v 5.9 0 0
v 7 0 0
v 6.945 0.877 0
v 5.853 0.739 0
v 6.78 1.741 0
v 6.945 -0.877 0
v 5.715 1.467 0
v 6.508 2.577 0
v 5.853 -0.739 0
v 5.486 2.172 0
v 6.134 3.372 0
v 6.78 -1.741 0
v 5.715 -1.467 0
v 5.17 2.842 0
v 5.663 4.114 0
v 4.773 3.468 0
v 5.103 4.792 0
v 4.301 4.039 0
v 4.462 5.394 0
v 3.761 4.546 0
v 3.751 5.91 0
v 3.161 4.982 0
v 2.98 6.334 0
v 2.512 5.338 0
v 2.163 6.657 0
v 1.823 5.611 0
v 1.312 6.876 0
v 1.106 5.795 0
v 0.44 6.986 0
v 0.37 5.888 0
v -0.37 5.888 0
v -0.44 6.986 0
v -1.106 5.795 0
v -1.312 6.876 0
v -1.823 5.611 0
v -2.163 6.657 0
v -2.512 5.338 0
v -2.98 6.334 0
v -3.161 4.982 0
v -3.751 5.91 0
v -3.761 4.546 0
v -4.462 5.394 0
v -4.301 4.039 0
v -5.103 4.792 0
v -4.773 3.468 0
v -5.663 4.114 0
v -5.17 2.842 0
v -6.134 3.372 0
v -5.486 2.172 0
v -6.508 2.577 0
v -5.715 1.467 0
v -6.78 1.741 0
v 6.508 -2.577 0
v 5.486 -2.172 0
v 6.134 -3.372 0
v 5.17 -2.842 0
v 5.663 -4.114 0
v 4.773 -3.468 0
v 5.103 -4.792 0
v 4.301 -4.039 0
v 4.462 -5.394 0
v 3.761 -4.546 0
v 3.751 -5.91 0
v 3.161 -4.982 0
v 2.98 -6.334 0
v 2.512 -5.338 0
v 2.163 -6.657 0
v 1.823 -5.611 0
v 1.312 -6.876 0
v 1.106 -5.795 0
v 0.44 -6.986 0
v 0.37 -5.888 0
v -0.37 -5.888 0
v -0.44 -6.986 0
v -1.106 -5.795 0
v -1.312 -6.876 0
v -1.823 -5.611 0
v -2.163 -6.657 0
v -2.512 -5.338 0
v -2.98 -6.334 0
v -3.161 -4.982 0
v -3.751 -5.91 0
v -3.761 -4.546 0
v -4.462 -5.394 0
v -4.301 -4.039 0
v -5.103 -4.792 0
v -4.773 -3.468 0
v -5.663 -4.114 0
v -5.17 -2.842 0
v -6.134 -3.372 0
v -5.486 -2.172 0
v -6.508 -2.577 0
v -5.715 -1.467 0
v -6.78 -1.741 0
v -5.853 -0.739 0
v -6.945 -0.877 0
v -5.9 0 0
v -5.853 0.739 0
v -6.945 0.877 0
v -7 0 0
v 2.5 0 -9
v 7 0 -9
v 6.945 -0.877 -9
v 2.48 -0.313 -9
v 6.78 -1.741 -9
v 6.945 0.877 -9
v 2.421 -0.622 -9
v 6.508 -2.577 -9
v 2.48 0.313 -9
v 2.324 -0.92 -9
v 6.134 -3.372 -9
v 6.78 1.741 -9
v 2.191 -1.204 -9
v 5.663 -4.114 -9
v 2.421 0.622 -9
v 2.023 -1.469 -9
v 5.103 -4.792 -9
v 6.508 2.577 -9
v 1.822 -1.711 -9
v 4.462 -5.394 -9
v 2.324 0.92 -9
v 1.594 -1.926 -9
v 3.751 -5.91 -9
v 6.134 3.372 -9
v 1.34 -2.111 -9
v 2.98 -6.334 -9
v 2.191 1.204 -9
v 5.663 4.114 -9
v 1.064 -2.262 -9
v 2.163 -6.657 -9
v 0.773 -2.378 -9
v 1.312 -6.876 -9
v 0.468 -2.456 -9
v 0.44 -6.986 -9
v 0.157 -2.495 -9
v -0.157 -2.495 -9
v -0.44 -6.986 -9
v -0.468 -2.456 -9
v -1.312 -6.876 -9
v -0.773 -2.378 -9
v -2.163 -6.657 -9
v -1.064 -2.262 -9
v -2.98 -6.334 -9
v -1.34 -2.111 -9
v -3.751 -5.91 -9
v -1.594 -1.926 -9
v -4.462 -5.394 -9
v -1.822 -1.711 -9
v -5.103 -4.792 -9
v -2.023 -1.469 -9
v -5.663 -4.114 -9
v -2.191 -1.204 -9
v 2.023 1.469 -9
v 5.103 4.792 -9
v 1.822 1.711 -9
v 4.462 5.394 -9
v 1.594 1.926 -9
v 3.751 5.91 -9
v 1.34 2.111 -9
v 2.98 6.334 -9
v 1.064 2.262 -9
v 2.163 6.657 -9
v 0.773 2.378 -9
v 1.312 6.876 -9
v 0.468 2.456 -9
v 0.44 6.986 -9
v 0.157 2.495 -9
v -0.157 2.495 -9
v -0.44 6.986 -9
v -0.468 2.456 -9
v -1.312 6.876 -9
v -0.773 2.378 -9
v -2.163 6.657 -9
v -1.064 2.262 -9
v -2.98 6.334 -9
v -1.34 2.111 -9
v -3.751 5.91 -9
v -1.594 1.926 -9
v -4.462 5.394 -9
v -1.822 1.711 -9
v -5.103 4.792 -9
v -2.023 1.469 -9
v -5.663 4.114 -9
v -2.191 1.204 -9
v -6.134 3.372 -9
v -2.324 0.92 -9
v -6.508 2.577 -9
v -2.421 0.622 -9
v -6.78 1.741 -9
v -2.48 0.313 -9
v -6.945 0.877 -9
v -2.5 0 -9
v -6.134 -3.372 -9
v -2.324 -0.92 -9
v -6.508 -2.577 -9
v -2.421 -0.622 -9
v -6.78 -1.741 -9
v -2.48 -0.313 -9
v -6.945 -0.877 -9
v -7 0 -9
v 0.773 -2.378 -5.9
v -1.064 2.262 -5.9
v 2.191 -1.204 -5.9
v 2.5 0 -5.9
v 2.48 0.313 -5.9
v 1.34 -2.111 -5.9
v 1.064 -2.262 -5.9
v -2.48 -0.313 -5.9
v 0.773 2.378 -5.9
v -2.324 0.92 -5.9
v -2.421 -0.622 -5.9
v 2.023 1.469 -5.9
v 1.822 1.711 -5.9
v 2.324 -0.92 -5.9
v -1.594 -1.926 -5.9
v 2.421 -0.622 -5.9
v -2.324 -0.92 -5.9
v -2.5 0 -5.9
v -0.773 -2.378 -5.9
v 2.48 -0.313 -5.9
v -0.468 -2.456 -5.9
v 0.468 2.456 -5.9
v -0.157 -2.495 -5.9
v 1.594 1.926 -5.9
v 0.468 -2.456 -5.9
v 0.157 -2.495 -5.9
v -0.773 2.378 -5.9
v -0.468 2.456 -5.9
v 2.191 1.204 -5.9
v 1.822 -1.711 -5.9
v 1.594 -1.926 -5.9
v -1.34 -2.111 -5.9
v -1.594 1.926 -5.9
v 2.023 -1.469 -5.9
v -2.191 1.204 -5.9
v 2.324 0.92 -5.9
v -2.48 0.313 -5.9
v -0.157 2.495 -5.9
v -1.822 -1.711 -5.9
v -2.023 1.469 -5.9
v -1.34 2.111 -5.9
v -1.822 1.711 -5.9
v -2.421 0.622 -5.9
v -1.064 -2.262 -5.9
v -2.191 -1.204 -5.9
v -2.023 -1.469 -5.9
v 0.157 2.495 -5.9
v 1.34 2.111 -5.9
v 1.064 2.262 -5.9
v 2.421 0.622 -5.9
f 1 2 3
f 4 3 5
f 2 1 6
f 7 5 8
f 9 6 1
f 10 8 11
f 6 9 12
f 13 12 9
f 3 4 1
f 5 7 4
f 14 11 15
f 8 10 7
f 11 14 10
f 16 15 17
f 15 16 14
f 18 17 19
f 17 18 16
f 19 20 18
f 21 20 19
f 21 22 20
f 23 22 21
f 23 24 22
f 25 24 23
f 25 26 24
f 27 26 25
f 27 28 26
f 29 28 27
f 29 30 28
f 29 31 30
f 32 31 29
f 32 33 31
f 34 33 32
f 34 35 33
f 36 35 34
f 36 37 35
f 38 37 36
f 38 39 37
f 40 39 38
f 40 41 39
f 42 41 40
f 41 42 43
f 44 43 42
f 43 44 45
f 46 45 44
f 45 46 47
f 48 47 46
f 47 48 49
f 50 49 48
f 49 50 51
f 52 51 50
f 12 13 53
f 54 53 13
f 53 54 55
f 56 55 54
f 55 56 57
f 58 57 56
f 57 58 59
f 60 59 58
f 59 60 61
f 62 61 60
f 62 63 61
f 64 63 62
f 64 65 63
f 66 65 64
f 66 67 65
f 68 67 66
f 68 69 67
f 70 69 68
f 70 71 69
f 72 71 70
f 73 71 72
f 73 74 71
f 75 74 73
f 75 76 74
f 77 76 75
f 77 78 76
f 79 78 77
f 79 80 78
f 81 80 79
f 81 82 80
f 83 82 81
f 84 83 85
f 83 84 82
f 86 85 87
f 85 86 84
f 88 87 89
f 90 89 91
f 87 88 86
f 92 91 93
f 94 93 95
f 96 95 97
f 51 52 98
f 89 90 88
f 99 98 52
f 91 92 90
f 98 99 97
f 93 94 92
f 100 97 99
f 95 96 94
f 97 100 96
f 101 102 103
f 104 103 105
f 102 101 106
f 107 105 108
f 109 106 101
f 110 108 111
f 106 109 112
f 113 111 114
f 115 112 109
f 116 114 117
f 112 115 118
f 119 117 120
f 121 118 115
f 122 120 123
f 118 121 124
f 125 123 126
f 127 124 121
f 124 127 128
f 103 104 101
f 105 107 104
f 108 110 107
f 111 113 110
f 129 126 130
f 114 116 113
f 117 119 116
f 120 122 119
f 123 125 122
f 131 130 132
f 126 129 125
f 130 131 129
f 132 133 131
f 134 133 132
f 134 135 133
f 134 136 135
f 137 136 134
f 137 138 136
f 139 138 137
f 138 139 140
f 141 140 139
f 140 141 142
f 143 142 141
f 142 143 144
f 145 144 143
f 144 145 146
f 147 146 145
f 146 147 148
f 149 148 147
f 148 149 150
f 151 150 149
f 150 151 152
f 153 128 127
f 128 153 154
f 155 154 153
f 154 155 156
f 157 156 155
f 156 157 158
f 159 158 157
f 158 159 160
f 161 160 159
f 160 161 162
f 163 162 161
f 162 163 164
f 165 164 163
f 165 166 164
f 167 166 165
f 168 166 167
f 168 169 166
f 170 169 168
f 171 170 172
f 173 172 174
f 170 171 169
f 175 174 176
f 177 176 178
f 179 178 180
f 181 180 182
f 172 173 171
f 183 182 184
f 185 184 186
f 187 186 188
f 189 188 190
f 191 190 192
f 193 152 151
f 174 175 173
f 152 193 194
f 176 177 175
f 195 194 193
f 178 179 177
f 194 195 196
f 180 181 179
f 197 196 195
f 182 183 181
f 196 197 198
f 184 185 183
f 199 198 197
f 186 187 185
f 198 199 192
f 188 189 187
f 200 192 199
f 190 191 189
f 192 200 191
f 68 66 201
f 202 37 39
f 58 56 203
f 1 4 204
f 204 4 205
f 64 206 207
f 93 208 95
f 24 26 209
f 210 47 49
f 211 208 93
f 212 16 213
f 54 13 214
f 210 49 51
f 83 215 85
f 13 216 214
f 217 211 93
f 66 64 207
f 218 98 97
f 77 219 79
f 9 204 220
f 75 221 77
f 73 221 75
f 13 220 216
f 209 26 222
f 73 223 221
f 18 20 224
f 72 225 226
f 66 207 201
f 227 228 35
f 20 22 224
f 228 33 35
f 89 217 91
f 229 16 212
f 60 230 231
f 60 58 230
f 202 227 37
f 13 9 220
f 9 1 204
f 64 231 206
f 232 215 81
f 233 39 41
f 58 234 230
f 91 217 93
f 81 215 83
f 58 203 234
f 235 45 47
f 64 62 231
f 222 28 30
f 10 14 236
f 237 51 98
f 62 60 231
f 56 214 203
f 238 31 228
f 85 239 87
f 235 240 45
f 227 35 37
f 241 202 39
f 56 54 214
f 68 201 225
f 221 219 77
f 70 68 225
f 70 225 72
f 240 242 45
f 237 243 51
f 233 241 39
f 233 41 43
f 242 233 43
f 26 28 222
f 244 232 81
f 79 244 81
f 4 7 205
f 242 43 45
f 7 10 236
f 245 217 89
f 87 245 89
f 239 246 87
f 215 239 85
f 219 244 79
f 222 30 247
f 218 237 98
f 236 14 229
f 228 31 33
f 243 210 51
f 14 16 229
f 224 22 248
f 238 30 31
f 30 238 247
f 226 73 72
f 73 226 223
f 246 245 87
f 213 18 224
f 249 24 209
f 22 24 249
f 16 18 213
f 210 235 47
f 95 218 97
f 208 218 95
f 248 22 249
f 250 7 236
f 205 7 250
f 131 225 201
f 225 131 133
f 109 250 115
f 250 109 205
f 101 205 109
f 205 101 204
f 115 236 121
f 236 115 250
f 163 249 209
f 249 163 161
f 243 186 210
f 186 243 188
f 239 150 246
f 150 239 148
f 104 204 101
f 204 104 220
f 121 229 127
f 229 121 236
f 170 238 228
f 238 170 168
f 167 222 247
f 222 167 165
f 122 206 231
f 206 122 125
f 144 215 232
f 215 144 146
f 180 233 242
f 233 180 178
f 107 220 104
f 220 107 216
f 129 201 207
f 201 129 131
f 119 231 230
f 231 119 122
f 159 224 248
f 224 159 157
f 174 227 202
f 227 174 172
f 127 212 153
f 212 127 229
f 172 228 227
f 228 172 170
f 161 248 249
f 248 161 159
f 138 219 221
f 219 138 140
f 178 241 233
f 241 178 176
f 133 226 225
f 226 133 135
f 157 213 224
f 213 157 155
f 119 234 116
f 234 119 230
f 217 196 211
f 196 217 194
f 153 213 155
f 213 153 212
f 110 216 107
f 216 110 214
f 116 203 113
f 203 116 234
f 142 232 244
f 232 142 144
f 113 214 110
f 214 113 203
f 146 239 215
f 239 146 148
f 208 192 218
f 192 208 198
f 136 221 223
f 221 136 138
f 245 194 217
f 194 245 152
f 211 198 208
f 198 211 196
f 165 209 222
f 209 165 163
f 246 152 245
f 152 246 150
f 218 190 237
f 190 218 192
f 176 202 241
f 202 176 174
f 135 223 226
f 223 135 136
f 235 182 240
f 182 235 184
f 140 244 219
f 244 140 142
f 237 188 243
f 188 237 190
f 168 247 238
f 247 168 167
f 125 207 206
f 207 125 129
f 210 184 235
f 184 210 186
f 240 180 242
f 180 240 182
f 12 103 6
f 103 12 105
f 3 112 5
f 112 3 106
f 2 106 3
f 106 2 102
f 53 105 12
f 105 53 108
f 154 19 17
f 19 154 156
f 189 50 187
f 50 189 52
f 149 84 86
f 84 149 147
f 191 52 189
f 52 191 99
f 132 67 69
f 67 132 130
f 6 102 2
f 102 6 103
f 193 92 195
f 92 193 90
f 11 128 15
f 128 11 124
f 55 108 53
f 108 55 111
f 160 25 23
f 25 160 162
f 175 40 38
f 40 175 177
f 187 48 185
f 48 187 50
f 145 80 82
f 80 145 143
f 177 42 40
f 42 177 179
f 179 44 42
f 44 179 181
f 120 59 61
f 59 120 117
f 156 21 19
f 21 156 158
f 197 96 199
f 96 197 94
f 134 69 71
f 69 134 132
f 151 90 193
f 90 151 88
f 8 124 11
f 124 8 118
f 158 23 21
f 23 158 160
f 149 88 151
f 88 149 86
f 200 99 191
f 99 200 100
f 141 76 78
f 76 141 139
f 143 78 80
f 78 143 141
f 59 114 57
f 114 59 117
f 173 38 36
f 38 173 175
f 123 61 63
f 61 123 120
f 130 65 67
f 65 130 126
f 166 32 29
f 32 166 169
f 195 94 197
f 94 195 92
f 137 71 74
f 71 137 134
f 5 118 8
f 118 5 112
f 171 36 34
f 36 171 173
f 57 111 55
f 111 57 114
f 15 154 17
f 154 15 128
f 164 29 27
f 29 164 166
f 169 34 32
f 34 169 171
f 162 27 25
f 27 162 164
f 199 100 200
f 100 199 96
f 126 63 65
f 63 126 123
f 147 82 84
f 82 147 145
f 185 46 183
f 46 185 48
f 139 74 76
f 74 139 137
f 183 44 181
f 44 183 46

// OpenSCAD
$fn = 50;


difference() {
	union() {
		translate(v = [0, 0, -9.0000000000]) {
			cylinder(h = 9, r = 7.0000000000);
		}
	}
	union() {
		translate(v = [0, 0, 0]) {
			rotate(a = [0, 0, 0]) {
				difference() {
					union() {
						#translate(v = [0, 0, -9.0000000000]) {
							cylinder(h = 9, r = 2.2500000000);
						}
						#translate(v = [0, 0, -5.9000000000]) {
							cylinder(h = 5.9000000000, r1 = 2.5000000000, r2 = 5.9000000000);
						}
						#translate(v = [0, 0, -9.0000000000]) {
							cylinder(h = 9, r = 2.5000000000);
						}
						#translate(v = [0, 0, -9.0000000000]) {
							cylinder(h = 9, r = 2.2500000000);
						}
					}
					union();
				}
			}
		}
	}
}
